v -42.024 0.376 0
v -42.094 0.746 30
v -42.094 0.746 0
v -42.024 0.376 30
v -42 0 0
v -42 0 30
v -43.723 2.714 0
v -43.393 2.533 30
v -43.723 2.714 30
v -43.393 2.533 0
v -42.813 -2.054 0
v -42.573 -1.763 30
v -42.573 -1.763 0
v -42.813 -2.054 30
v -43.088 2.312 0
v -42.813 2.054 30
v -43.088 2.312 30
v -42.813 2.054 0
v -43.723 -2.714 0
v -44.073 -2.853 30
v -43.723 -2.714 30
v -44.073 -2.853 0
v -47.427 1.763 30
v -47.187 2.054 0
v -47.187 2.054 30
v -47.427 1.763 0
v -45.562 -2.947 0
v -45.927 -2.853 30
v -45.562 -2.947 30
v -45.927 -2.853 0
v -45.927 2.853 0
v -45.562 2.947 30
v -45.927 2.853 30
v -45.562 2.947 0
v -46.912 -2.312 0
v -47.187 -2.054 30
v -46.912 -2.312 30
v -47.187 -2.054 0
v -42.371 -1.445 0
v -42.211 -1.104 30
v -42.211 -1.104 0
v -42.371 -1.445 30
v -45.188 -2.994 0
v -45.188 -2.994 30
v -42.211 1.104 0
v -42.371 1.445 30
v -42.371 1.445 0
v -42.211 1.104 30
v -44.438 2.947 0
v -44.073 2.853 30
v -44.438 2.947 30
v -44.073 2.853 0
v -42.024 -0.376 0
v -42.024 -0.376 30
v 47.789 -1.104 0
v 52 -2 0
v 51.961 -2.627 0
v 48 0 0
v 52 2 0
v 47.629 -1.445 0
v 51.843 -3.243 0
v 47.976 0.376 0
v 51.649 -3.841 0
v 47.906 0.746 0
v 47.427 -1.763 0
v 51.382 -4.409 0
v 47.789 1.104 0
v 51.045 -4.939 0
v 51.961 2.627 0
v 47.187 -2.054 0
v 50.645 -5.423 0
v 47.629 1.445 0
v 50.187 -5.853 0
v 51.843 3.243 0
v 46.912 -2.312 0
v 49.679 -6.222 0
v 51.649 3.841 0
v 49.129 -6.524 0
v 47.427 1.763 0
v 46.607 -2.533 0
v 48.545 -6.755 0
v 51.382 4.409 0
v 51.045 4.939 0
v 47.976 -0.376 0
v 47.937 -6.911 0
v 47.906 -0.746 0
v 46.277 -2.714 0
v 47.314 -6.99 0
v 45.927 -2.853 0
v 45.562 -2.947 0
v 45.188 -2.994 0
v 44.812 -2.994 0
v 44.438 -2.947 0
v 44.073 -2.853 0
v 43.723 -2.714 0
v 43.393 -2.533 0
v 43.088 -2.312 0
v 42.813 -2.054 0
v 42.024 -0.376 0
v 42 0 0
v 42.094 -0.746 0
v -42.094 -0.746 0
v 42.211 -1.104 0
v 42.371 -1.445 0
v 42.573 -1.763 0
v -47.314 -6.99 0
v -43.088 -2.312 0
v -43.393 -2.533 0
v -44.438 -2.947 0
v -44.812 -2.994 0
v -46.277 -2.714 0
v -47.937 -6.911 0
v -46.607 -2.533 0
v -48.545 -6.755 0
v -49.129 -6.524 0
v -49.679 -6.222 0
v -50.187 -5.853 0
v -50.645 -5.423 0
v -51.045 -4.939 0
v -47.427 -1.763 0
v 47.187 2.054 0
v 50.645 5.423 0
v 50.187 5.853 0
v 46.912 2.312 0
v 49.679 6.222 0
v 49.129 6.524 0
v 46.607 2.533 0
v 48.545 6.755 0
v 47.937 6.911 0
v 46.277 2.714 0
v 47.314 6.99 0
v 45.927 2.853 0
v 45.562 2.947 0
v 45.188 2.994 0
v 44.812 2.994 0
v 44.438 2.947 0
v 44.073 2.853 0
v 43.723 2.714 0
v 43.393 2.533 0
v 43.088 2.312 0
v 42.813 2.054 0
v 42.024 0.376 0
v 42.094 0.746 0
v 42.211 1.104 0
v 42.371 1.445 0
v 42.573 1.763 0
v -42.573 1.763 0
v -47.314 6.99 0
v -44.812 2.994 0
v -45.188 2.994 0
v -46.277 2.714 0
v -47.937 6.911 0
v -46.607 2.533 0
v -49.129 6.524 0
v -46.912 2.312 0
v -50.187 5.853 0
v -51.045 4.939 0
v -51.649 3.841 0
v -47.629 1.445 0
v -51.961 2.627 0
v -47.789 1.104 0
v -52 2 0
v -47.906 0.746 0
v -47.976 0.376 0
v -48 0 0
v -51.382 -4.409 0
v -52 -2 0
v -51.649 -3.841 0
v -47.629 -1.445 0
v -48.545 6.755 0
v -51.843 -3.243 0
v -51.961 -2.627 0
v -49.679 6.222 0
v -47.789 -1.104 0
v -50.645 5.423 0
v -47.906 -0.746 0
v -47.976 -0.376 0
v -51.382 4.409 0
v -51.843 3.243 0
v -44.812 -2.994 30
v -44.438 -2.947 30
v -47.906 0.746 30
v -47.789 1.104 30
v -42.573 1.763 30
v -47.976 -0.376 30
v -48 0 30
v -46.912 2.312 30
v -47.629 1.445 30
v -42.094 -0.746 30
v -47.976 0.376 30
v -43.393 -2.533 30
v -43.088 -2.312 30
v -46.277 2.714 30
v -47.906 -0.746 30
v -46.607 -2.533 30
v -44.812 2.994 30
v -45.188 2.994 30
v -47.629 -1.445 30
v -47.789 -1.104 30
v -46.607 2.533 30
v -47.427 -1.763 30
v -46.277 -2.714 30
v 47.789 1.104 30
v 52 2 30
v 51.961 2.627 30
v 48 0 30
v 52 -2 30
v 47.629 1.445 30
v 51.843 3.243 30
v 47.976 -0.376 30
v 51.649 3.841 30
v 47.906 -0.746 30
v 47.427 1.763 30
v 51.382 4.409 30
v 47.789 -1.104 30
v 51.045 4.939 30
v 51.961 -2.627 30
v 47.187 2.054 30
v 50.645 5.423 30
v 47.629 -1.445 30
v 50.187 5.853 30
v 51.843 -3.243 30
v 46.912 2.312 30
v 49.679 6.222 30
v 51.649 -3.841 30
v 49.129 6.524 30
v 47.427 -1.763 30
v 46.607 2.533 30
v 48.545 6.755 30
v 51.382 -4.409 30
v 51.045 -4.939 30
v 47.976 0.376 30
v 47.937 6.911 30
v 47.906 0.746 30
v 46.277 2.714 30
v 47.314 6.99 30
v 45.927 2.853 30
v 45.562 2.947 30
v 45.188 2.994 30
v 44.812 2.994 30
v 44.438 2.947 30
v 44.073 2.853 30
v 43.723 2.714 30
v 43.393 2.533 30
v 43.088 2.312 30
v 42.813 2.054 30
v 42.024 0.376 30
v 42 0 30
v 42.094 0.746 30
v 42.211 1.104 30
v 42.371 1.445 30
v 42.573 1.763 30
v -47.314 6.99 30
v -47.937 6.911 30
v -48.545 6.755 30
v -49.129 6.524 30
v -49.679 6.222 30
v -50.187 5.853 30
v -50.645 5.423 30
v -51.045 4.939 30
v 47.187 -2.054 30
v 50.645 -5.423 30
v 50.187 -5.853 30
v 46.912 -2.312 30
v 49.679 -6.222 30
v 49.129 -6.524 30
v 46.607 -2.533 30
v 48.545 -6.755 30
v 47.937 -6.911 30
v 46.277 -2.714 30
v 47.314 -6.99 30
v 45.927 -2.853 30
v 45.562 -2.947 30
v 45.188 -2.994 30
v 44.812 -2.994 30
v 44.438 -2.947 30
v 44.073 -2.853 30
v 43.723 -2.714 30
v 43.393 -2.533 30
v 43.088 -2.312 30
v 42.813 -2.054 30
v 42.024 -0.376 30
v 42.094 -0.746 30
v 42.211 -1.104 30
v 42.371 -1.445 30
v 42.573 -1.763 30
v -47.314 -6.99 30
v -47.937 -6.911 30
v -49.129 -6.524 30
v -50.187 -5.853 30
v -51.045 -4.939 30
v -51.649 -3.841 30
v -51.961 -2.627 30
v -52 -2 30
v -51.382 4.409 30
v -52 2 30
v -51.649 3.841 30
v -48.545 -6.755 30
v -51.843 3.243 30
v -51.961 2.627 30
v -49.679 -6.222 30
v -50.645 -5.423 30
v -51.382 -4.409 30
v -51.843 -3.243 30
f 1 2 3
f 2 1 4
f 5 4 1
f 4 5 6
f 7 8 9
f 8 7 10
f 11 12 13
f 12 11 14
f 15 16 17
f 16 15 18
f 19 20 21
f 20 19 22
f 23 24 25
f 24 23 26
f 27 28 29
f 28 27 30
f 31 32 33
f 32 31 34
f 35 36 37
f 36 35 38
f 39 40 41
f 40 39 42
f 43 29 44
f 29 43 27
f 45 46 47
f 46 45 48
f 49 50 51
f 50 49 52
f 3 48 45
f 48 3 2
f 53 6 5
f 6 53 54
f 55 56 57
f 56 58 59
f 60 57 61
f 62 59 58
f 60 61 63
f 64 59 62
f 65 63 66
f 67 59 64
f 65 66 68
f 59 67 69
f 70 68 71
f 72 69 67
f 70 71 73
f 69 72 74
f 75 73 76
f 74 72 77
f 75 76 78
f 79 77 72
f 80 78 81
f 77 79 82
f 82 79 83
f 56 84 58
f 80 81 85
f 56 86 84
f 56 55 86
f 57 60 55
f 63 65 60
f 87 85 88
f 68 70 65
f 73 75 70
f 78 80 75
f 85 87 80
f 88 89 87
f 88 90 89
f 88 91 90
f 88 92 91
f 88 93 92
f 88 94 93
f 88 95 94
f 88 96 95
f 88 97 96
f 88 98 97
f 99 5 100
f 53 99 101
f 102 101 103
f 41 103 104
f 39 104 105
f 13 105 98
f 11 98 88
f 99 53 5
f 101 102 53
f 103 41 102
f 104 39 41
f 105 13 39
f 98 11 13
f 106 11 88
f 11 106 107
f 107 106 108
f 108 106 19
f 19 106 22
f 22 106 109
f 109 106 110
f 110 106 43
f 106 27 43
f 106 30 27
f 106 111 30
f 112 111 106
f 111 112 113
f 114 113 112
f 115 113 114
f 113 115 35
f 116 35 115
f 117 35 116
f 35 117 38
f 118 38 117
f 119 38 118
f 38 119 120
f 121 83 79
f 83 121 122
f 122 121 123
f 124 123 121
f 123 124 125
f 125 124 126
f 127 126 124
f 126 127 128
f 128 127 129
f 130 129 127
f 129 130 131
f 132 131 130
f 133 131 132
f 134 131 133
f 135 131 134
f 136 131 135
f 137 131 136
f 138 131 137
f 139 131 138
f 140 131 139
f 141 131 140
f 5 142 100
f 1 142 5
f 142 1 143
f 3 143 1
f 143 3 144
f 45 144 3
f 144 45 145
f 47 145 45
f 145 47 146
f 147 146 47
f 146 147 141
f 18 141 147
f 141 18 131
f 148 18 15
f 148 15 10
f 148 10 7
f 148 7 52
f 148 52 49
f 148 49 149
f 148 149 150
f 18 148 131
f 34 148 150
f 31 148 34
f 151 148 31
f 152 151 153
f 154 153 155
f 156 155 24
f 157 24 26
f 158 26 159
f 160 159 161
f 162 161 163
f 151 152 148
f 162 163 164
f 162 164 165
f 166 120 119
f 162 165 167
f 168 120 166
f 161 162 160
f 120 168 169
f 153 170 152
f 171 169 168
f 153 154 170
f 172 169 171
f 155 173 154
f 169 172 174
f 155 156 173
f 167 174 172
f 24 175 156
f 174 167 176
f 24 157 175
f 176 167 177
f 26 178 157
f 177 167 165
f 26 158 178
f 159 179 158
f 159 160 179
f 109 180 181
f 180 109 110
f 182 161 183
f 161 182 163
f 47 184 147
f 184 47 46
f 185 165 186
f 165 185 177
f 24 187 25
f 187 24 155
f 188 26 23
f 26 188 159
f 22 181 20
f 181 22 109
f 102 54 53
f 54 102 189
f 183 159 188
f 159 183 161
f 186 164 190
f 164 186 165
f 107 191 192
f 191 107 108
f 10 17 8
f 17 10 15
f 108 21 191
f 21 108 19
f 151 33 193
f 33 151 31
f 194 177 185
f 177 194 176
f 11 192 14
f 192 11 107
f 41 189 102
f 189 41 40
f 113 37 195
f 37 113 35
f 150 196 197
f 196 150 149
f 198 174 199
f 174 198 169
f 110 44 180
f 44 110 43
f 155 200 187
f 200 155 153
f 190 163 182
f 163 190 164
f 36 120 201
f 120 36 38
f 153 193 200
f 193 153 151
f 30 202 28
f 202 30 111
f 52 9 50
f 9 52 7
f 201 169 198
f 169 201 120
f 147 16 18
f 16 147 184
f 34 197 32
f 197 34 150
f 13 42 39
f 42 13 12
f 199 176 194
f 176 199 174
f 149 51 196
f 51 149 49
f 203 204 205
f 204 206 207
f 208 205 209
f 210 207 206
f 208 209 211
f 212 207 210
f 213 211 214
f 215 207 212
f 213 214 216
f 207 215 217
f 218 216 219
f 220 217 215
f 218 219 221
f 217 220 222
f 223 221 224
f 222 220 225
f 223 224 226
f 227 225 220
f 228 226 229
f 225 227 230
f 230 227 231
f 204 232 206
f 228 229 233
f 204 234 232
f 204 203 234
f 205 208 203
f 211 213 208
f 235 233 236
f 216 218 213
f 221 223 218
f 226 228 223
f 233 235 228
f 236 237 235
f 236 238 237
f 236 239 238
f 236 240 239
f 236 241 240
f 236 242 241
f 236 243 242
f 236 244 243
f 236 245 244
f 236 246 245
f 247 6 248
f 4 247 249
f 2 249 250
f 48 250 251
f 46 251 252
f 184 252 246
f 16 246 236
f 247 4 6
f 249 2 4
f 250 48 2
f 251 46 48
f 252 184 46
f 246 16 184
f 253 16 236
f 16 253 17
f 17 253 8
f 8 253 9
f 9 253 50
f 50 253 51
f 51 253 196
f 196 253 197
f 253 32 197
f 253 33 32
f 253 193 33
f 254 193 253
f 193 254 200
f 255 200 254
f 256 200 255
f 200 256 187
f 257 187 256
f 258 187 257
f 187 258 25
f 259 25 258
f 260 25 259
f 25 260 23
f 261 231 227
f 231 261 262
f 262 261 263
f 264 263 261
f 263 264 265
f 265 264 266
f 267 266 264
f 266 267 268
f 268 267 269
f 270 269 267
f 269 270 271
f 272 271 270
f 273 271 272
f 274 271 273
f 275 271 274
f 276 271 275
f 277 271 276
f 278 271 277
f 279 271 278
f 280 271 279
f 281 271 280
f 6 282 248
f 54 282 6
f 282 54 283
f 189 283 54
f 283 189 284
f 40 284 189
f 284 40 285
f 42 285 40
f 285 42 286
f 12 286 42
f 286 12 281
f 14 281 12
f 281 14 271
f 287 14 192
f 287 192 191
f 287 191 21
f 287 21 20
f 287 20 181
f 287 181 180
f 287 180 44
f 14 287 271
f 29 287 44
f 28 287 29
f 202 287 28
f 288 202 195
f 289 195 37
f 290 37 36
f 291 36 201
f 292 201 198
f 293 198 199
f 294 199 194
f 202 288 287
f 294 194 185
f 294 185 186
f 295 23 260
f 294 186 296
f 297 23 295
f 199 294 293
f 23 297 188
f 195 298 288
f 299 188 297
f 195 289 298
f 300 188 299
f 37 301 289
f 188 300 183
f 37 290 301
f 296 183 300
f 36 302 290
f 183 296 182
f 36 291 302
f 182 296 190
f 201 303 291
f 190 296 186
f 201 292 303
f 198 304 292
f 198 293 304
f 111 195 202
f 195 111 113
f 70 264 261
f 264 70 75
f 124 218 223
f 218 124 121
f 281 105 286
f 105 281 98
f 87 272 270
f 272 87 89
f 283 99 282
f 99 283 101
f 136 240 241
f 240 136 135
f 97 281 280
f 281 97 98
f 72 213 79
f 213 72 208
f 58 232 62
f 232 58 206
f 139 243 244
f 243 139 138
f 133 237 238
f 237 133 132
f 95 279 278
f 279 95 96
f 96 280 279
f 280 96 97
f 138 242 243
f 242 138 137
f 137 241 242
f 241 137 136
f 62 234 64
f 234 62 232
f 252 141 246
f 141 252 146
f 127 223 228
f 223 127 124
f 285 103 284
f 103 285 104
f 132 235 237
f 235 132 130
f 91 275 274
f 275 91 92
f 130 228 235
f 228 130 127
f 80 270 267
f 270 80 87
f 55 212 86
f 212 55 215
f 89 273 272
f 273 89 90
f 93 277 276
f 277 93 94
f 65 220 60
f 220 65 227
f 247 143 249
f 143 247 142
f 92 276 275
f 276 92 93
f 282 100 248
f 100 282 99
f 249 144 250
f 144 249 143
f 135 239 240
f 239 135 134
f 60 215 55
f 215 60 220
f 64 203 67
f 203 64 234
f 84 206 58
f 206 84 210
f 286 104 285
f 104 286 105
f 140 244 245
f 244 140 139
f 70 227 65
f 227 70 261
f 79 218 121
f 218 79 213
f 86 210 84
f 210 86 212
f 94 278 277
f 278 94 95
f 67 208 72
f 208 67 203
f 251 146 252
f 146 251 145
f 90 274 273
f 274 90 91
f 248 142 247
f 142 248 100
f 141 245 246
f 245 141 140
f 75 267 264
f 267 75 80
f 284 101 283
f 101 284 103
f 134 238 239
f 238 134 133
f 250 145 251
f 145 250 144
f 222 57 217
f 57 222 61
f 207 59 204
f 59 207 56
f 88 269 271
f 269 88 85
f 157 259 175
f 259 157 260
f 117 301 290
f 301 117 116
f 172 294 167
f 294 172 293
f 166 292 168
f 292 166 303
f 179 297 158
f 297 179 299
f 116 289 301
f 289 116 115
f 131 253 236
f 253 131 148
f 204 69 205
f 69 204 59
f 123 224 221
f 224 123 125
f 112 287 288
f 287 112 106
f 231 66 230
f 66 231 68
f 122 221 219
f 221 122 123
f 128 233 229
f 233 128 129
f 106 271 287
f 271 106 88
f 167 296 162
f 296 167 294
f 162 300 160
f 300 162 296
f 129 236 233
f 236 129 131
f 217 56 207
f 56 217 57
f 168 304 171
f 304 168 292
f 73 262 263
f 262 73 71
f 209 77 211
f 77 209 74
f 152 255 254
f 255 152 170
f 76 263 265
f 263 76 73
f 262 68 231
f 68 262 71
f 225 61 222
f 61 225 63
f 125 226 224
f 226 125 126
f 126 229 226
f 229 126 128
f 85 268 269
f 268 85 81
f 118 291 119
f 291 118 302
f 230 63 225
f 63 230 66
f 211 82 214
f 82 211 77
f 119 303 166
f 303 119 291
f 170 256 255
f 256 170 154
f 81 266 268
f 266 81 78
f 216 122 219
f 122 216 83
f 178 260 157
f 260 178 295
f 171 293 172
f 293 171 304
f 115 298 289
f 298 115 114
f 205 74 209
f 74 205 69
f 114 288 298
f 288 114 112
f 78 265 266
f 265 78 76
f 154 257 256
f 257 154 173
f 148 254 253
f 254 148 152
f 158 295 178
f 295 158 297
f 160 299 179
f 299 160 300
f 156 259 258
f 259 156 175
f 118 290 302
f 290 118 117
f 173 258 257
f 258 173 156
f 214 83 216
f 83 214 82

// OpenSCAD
$fn = 50;


difference() {
	union() {
		hull() {
			translate(v = [-47.0000000000, 2.0000000000, 0]) {
				cylinder(h = 30, r = 5);
			}
			translate(v = [47.0000000000, 2.0000000000, 0]) {
				cylinder(h = 30, r = 5);
			}
			translate(v = [-47.0000000000, -2.0000000000, 0]) {
				cylinder(h = 30, r = 5);
			}
			translate(v = [47.0000000000, -2.0000000000, 0]) {
				cylinder(h = 30, r = 5);
			}
		}
	}
	union() {
		translate(v = [-45.0000000000, 0.0000000000, 0]) {
			cylinder(h = 30, r = 3.0000000000);
		}
		translate(v = [45.0000000000, 0.0000000000, 0]) {
			cylinder(h = 30, r = 3.0000000000);
		}
		translate(v = [-45.0000000000, 0.0000000000, 0]) {
			cylinder(h = 30, r = 1.5000000000);
		}
		translate(v = [45.0000000000, 0.0000000000, 0]) {
			cylinder(h = 30, r = 1.5000000000);
		}
		translate(v = [-45.0000000000, 0.0000000000, 0]) {
			cylinder(h = 30, r = 1.5000000000);
		}
		translate(v = [45.0000000000, 0.0000000000, 0]) {
			cylinder(h = 30, r = 1.5000000000);
		}
		translate(v = [-45.0000000000, 0.0000000000, 0]) {
			cylinder(h = 30, r = 1.5000000000);
		}
		translate(v = [45.0000000000, 0.0000000000, 0]) {
			cylinder(h = 30, r = 1.5000000000);
		}
	}
}
